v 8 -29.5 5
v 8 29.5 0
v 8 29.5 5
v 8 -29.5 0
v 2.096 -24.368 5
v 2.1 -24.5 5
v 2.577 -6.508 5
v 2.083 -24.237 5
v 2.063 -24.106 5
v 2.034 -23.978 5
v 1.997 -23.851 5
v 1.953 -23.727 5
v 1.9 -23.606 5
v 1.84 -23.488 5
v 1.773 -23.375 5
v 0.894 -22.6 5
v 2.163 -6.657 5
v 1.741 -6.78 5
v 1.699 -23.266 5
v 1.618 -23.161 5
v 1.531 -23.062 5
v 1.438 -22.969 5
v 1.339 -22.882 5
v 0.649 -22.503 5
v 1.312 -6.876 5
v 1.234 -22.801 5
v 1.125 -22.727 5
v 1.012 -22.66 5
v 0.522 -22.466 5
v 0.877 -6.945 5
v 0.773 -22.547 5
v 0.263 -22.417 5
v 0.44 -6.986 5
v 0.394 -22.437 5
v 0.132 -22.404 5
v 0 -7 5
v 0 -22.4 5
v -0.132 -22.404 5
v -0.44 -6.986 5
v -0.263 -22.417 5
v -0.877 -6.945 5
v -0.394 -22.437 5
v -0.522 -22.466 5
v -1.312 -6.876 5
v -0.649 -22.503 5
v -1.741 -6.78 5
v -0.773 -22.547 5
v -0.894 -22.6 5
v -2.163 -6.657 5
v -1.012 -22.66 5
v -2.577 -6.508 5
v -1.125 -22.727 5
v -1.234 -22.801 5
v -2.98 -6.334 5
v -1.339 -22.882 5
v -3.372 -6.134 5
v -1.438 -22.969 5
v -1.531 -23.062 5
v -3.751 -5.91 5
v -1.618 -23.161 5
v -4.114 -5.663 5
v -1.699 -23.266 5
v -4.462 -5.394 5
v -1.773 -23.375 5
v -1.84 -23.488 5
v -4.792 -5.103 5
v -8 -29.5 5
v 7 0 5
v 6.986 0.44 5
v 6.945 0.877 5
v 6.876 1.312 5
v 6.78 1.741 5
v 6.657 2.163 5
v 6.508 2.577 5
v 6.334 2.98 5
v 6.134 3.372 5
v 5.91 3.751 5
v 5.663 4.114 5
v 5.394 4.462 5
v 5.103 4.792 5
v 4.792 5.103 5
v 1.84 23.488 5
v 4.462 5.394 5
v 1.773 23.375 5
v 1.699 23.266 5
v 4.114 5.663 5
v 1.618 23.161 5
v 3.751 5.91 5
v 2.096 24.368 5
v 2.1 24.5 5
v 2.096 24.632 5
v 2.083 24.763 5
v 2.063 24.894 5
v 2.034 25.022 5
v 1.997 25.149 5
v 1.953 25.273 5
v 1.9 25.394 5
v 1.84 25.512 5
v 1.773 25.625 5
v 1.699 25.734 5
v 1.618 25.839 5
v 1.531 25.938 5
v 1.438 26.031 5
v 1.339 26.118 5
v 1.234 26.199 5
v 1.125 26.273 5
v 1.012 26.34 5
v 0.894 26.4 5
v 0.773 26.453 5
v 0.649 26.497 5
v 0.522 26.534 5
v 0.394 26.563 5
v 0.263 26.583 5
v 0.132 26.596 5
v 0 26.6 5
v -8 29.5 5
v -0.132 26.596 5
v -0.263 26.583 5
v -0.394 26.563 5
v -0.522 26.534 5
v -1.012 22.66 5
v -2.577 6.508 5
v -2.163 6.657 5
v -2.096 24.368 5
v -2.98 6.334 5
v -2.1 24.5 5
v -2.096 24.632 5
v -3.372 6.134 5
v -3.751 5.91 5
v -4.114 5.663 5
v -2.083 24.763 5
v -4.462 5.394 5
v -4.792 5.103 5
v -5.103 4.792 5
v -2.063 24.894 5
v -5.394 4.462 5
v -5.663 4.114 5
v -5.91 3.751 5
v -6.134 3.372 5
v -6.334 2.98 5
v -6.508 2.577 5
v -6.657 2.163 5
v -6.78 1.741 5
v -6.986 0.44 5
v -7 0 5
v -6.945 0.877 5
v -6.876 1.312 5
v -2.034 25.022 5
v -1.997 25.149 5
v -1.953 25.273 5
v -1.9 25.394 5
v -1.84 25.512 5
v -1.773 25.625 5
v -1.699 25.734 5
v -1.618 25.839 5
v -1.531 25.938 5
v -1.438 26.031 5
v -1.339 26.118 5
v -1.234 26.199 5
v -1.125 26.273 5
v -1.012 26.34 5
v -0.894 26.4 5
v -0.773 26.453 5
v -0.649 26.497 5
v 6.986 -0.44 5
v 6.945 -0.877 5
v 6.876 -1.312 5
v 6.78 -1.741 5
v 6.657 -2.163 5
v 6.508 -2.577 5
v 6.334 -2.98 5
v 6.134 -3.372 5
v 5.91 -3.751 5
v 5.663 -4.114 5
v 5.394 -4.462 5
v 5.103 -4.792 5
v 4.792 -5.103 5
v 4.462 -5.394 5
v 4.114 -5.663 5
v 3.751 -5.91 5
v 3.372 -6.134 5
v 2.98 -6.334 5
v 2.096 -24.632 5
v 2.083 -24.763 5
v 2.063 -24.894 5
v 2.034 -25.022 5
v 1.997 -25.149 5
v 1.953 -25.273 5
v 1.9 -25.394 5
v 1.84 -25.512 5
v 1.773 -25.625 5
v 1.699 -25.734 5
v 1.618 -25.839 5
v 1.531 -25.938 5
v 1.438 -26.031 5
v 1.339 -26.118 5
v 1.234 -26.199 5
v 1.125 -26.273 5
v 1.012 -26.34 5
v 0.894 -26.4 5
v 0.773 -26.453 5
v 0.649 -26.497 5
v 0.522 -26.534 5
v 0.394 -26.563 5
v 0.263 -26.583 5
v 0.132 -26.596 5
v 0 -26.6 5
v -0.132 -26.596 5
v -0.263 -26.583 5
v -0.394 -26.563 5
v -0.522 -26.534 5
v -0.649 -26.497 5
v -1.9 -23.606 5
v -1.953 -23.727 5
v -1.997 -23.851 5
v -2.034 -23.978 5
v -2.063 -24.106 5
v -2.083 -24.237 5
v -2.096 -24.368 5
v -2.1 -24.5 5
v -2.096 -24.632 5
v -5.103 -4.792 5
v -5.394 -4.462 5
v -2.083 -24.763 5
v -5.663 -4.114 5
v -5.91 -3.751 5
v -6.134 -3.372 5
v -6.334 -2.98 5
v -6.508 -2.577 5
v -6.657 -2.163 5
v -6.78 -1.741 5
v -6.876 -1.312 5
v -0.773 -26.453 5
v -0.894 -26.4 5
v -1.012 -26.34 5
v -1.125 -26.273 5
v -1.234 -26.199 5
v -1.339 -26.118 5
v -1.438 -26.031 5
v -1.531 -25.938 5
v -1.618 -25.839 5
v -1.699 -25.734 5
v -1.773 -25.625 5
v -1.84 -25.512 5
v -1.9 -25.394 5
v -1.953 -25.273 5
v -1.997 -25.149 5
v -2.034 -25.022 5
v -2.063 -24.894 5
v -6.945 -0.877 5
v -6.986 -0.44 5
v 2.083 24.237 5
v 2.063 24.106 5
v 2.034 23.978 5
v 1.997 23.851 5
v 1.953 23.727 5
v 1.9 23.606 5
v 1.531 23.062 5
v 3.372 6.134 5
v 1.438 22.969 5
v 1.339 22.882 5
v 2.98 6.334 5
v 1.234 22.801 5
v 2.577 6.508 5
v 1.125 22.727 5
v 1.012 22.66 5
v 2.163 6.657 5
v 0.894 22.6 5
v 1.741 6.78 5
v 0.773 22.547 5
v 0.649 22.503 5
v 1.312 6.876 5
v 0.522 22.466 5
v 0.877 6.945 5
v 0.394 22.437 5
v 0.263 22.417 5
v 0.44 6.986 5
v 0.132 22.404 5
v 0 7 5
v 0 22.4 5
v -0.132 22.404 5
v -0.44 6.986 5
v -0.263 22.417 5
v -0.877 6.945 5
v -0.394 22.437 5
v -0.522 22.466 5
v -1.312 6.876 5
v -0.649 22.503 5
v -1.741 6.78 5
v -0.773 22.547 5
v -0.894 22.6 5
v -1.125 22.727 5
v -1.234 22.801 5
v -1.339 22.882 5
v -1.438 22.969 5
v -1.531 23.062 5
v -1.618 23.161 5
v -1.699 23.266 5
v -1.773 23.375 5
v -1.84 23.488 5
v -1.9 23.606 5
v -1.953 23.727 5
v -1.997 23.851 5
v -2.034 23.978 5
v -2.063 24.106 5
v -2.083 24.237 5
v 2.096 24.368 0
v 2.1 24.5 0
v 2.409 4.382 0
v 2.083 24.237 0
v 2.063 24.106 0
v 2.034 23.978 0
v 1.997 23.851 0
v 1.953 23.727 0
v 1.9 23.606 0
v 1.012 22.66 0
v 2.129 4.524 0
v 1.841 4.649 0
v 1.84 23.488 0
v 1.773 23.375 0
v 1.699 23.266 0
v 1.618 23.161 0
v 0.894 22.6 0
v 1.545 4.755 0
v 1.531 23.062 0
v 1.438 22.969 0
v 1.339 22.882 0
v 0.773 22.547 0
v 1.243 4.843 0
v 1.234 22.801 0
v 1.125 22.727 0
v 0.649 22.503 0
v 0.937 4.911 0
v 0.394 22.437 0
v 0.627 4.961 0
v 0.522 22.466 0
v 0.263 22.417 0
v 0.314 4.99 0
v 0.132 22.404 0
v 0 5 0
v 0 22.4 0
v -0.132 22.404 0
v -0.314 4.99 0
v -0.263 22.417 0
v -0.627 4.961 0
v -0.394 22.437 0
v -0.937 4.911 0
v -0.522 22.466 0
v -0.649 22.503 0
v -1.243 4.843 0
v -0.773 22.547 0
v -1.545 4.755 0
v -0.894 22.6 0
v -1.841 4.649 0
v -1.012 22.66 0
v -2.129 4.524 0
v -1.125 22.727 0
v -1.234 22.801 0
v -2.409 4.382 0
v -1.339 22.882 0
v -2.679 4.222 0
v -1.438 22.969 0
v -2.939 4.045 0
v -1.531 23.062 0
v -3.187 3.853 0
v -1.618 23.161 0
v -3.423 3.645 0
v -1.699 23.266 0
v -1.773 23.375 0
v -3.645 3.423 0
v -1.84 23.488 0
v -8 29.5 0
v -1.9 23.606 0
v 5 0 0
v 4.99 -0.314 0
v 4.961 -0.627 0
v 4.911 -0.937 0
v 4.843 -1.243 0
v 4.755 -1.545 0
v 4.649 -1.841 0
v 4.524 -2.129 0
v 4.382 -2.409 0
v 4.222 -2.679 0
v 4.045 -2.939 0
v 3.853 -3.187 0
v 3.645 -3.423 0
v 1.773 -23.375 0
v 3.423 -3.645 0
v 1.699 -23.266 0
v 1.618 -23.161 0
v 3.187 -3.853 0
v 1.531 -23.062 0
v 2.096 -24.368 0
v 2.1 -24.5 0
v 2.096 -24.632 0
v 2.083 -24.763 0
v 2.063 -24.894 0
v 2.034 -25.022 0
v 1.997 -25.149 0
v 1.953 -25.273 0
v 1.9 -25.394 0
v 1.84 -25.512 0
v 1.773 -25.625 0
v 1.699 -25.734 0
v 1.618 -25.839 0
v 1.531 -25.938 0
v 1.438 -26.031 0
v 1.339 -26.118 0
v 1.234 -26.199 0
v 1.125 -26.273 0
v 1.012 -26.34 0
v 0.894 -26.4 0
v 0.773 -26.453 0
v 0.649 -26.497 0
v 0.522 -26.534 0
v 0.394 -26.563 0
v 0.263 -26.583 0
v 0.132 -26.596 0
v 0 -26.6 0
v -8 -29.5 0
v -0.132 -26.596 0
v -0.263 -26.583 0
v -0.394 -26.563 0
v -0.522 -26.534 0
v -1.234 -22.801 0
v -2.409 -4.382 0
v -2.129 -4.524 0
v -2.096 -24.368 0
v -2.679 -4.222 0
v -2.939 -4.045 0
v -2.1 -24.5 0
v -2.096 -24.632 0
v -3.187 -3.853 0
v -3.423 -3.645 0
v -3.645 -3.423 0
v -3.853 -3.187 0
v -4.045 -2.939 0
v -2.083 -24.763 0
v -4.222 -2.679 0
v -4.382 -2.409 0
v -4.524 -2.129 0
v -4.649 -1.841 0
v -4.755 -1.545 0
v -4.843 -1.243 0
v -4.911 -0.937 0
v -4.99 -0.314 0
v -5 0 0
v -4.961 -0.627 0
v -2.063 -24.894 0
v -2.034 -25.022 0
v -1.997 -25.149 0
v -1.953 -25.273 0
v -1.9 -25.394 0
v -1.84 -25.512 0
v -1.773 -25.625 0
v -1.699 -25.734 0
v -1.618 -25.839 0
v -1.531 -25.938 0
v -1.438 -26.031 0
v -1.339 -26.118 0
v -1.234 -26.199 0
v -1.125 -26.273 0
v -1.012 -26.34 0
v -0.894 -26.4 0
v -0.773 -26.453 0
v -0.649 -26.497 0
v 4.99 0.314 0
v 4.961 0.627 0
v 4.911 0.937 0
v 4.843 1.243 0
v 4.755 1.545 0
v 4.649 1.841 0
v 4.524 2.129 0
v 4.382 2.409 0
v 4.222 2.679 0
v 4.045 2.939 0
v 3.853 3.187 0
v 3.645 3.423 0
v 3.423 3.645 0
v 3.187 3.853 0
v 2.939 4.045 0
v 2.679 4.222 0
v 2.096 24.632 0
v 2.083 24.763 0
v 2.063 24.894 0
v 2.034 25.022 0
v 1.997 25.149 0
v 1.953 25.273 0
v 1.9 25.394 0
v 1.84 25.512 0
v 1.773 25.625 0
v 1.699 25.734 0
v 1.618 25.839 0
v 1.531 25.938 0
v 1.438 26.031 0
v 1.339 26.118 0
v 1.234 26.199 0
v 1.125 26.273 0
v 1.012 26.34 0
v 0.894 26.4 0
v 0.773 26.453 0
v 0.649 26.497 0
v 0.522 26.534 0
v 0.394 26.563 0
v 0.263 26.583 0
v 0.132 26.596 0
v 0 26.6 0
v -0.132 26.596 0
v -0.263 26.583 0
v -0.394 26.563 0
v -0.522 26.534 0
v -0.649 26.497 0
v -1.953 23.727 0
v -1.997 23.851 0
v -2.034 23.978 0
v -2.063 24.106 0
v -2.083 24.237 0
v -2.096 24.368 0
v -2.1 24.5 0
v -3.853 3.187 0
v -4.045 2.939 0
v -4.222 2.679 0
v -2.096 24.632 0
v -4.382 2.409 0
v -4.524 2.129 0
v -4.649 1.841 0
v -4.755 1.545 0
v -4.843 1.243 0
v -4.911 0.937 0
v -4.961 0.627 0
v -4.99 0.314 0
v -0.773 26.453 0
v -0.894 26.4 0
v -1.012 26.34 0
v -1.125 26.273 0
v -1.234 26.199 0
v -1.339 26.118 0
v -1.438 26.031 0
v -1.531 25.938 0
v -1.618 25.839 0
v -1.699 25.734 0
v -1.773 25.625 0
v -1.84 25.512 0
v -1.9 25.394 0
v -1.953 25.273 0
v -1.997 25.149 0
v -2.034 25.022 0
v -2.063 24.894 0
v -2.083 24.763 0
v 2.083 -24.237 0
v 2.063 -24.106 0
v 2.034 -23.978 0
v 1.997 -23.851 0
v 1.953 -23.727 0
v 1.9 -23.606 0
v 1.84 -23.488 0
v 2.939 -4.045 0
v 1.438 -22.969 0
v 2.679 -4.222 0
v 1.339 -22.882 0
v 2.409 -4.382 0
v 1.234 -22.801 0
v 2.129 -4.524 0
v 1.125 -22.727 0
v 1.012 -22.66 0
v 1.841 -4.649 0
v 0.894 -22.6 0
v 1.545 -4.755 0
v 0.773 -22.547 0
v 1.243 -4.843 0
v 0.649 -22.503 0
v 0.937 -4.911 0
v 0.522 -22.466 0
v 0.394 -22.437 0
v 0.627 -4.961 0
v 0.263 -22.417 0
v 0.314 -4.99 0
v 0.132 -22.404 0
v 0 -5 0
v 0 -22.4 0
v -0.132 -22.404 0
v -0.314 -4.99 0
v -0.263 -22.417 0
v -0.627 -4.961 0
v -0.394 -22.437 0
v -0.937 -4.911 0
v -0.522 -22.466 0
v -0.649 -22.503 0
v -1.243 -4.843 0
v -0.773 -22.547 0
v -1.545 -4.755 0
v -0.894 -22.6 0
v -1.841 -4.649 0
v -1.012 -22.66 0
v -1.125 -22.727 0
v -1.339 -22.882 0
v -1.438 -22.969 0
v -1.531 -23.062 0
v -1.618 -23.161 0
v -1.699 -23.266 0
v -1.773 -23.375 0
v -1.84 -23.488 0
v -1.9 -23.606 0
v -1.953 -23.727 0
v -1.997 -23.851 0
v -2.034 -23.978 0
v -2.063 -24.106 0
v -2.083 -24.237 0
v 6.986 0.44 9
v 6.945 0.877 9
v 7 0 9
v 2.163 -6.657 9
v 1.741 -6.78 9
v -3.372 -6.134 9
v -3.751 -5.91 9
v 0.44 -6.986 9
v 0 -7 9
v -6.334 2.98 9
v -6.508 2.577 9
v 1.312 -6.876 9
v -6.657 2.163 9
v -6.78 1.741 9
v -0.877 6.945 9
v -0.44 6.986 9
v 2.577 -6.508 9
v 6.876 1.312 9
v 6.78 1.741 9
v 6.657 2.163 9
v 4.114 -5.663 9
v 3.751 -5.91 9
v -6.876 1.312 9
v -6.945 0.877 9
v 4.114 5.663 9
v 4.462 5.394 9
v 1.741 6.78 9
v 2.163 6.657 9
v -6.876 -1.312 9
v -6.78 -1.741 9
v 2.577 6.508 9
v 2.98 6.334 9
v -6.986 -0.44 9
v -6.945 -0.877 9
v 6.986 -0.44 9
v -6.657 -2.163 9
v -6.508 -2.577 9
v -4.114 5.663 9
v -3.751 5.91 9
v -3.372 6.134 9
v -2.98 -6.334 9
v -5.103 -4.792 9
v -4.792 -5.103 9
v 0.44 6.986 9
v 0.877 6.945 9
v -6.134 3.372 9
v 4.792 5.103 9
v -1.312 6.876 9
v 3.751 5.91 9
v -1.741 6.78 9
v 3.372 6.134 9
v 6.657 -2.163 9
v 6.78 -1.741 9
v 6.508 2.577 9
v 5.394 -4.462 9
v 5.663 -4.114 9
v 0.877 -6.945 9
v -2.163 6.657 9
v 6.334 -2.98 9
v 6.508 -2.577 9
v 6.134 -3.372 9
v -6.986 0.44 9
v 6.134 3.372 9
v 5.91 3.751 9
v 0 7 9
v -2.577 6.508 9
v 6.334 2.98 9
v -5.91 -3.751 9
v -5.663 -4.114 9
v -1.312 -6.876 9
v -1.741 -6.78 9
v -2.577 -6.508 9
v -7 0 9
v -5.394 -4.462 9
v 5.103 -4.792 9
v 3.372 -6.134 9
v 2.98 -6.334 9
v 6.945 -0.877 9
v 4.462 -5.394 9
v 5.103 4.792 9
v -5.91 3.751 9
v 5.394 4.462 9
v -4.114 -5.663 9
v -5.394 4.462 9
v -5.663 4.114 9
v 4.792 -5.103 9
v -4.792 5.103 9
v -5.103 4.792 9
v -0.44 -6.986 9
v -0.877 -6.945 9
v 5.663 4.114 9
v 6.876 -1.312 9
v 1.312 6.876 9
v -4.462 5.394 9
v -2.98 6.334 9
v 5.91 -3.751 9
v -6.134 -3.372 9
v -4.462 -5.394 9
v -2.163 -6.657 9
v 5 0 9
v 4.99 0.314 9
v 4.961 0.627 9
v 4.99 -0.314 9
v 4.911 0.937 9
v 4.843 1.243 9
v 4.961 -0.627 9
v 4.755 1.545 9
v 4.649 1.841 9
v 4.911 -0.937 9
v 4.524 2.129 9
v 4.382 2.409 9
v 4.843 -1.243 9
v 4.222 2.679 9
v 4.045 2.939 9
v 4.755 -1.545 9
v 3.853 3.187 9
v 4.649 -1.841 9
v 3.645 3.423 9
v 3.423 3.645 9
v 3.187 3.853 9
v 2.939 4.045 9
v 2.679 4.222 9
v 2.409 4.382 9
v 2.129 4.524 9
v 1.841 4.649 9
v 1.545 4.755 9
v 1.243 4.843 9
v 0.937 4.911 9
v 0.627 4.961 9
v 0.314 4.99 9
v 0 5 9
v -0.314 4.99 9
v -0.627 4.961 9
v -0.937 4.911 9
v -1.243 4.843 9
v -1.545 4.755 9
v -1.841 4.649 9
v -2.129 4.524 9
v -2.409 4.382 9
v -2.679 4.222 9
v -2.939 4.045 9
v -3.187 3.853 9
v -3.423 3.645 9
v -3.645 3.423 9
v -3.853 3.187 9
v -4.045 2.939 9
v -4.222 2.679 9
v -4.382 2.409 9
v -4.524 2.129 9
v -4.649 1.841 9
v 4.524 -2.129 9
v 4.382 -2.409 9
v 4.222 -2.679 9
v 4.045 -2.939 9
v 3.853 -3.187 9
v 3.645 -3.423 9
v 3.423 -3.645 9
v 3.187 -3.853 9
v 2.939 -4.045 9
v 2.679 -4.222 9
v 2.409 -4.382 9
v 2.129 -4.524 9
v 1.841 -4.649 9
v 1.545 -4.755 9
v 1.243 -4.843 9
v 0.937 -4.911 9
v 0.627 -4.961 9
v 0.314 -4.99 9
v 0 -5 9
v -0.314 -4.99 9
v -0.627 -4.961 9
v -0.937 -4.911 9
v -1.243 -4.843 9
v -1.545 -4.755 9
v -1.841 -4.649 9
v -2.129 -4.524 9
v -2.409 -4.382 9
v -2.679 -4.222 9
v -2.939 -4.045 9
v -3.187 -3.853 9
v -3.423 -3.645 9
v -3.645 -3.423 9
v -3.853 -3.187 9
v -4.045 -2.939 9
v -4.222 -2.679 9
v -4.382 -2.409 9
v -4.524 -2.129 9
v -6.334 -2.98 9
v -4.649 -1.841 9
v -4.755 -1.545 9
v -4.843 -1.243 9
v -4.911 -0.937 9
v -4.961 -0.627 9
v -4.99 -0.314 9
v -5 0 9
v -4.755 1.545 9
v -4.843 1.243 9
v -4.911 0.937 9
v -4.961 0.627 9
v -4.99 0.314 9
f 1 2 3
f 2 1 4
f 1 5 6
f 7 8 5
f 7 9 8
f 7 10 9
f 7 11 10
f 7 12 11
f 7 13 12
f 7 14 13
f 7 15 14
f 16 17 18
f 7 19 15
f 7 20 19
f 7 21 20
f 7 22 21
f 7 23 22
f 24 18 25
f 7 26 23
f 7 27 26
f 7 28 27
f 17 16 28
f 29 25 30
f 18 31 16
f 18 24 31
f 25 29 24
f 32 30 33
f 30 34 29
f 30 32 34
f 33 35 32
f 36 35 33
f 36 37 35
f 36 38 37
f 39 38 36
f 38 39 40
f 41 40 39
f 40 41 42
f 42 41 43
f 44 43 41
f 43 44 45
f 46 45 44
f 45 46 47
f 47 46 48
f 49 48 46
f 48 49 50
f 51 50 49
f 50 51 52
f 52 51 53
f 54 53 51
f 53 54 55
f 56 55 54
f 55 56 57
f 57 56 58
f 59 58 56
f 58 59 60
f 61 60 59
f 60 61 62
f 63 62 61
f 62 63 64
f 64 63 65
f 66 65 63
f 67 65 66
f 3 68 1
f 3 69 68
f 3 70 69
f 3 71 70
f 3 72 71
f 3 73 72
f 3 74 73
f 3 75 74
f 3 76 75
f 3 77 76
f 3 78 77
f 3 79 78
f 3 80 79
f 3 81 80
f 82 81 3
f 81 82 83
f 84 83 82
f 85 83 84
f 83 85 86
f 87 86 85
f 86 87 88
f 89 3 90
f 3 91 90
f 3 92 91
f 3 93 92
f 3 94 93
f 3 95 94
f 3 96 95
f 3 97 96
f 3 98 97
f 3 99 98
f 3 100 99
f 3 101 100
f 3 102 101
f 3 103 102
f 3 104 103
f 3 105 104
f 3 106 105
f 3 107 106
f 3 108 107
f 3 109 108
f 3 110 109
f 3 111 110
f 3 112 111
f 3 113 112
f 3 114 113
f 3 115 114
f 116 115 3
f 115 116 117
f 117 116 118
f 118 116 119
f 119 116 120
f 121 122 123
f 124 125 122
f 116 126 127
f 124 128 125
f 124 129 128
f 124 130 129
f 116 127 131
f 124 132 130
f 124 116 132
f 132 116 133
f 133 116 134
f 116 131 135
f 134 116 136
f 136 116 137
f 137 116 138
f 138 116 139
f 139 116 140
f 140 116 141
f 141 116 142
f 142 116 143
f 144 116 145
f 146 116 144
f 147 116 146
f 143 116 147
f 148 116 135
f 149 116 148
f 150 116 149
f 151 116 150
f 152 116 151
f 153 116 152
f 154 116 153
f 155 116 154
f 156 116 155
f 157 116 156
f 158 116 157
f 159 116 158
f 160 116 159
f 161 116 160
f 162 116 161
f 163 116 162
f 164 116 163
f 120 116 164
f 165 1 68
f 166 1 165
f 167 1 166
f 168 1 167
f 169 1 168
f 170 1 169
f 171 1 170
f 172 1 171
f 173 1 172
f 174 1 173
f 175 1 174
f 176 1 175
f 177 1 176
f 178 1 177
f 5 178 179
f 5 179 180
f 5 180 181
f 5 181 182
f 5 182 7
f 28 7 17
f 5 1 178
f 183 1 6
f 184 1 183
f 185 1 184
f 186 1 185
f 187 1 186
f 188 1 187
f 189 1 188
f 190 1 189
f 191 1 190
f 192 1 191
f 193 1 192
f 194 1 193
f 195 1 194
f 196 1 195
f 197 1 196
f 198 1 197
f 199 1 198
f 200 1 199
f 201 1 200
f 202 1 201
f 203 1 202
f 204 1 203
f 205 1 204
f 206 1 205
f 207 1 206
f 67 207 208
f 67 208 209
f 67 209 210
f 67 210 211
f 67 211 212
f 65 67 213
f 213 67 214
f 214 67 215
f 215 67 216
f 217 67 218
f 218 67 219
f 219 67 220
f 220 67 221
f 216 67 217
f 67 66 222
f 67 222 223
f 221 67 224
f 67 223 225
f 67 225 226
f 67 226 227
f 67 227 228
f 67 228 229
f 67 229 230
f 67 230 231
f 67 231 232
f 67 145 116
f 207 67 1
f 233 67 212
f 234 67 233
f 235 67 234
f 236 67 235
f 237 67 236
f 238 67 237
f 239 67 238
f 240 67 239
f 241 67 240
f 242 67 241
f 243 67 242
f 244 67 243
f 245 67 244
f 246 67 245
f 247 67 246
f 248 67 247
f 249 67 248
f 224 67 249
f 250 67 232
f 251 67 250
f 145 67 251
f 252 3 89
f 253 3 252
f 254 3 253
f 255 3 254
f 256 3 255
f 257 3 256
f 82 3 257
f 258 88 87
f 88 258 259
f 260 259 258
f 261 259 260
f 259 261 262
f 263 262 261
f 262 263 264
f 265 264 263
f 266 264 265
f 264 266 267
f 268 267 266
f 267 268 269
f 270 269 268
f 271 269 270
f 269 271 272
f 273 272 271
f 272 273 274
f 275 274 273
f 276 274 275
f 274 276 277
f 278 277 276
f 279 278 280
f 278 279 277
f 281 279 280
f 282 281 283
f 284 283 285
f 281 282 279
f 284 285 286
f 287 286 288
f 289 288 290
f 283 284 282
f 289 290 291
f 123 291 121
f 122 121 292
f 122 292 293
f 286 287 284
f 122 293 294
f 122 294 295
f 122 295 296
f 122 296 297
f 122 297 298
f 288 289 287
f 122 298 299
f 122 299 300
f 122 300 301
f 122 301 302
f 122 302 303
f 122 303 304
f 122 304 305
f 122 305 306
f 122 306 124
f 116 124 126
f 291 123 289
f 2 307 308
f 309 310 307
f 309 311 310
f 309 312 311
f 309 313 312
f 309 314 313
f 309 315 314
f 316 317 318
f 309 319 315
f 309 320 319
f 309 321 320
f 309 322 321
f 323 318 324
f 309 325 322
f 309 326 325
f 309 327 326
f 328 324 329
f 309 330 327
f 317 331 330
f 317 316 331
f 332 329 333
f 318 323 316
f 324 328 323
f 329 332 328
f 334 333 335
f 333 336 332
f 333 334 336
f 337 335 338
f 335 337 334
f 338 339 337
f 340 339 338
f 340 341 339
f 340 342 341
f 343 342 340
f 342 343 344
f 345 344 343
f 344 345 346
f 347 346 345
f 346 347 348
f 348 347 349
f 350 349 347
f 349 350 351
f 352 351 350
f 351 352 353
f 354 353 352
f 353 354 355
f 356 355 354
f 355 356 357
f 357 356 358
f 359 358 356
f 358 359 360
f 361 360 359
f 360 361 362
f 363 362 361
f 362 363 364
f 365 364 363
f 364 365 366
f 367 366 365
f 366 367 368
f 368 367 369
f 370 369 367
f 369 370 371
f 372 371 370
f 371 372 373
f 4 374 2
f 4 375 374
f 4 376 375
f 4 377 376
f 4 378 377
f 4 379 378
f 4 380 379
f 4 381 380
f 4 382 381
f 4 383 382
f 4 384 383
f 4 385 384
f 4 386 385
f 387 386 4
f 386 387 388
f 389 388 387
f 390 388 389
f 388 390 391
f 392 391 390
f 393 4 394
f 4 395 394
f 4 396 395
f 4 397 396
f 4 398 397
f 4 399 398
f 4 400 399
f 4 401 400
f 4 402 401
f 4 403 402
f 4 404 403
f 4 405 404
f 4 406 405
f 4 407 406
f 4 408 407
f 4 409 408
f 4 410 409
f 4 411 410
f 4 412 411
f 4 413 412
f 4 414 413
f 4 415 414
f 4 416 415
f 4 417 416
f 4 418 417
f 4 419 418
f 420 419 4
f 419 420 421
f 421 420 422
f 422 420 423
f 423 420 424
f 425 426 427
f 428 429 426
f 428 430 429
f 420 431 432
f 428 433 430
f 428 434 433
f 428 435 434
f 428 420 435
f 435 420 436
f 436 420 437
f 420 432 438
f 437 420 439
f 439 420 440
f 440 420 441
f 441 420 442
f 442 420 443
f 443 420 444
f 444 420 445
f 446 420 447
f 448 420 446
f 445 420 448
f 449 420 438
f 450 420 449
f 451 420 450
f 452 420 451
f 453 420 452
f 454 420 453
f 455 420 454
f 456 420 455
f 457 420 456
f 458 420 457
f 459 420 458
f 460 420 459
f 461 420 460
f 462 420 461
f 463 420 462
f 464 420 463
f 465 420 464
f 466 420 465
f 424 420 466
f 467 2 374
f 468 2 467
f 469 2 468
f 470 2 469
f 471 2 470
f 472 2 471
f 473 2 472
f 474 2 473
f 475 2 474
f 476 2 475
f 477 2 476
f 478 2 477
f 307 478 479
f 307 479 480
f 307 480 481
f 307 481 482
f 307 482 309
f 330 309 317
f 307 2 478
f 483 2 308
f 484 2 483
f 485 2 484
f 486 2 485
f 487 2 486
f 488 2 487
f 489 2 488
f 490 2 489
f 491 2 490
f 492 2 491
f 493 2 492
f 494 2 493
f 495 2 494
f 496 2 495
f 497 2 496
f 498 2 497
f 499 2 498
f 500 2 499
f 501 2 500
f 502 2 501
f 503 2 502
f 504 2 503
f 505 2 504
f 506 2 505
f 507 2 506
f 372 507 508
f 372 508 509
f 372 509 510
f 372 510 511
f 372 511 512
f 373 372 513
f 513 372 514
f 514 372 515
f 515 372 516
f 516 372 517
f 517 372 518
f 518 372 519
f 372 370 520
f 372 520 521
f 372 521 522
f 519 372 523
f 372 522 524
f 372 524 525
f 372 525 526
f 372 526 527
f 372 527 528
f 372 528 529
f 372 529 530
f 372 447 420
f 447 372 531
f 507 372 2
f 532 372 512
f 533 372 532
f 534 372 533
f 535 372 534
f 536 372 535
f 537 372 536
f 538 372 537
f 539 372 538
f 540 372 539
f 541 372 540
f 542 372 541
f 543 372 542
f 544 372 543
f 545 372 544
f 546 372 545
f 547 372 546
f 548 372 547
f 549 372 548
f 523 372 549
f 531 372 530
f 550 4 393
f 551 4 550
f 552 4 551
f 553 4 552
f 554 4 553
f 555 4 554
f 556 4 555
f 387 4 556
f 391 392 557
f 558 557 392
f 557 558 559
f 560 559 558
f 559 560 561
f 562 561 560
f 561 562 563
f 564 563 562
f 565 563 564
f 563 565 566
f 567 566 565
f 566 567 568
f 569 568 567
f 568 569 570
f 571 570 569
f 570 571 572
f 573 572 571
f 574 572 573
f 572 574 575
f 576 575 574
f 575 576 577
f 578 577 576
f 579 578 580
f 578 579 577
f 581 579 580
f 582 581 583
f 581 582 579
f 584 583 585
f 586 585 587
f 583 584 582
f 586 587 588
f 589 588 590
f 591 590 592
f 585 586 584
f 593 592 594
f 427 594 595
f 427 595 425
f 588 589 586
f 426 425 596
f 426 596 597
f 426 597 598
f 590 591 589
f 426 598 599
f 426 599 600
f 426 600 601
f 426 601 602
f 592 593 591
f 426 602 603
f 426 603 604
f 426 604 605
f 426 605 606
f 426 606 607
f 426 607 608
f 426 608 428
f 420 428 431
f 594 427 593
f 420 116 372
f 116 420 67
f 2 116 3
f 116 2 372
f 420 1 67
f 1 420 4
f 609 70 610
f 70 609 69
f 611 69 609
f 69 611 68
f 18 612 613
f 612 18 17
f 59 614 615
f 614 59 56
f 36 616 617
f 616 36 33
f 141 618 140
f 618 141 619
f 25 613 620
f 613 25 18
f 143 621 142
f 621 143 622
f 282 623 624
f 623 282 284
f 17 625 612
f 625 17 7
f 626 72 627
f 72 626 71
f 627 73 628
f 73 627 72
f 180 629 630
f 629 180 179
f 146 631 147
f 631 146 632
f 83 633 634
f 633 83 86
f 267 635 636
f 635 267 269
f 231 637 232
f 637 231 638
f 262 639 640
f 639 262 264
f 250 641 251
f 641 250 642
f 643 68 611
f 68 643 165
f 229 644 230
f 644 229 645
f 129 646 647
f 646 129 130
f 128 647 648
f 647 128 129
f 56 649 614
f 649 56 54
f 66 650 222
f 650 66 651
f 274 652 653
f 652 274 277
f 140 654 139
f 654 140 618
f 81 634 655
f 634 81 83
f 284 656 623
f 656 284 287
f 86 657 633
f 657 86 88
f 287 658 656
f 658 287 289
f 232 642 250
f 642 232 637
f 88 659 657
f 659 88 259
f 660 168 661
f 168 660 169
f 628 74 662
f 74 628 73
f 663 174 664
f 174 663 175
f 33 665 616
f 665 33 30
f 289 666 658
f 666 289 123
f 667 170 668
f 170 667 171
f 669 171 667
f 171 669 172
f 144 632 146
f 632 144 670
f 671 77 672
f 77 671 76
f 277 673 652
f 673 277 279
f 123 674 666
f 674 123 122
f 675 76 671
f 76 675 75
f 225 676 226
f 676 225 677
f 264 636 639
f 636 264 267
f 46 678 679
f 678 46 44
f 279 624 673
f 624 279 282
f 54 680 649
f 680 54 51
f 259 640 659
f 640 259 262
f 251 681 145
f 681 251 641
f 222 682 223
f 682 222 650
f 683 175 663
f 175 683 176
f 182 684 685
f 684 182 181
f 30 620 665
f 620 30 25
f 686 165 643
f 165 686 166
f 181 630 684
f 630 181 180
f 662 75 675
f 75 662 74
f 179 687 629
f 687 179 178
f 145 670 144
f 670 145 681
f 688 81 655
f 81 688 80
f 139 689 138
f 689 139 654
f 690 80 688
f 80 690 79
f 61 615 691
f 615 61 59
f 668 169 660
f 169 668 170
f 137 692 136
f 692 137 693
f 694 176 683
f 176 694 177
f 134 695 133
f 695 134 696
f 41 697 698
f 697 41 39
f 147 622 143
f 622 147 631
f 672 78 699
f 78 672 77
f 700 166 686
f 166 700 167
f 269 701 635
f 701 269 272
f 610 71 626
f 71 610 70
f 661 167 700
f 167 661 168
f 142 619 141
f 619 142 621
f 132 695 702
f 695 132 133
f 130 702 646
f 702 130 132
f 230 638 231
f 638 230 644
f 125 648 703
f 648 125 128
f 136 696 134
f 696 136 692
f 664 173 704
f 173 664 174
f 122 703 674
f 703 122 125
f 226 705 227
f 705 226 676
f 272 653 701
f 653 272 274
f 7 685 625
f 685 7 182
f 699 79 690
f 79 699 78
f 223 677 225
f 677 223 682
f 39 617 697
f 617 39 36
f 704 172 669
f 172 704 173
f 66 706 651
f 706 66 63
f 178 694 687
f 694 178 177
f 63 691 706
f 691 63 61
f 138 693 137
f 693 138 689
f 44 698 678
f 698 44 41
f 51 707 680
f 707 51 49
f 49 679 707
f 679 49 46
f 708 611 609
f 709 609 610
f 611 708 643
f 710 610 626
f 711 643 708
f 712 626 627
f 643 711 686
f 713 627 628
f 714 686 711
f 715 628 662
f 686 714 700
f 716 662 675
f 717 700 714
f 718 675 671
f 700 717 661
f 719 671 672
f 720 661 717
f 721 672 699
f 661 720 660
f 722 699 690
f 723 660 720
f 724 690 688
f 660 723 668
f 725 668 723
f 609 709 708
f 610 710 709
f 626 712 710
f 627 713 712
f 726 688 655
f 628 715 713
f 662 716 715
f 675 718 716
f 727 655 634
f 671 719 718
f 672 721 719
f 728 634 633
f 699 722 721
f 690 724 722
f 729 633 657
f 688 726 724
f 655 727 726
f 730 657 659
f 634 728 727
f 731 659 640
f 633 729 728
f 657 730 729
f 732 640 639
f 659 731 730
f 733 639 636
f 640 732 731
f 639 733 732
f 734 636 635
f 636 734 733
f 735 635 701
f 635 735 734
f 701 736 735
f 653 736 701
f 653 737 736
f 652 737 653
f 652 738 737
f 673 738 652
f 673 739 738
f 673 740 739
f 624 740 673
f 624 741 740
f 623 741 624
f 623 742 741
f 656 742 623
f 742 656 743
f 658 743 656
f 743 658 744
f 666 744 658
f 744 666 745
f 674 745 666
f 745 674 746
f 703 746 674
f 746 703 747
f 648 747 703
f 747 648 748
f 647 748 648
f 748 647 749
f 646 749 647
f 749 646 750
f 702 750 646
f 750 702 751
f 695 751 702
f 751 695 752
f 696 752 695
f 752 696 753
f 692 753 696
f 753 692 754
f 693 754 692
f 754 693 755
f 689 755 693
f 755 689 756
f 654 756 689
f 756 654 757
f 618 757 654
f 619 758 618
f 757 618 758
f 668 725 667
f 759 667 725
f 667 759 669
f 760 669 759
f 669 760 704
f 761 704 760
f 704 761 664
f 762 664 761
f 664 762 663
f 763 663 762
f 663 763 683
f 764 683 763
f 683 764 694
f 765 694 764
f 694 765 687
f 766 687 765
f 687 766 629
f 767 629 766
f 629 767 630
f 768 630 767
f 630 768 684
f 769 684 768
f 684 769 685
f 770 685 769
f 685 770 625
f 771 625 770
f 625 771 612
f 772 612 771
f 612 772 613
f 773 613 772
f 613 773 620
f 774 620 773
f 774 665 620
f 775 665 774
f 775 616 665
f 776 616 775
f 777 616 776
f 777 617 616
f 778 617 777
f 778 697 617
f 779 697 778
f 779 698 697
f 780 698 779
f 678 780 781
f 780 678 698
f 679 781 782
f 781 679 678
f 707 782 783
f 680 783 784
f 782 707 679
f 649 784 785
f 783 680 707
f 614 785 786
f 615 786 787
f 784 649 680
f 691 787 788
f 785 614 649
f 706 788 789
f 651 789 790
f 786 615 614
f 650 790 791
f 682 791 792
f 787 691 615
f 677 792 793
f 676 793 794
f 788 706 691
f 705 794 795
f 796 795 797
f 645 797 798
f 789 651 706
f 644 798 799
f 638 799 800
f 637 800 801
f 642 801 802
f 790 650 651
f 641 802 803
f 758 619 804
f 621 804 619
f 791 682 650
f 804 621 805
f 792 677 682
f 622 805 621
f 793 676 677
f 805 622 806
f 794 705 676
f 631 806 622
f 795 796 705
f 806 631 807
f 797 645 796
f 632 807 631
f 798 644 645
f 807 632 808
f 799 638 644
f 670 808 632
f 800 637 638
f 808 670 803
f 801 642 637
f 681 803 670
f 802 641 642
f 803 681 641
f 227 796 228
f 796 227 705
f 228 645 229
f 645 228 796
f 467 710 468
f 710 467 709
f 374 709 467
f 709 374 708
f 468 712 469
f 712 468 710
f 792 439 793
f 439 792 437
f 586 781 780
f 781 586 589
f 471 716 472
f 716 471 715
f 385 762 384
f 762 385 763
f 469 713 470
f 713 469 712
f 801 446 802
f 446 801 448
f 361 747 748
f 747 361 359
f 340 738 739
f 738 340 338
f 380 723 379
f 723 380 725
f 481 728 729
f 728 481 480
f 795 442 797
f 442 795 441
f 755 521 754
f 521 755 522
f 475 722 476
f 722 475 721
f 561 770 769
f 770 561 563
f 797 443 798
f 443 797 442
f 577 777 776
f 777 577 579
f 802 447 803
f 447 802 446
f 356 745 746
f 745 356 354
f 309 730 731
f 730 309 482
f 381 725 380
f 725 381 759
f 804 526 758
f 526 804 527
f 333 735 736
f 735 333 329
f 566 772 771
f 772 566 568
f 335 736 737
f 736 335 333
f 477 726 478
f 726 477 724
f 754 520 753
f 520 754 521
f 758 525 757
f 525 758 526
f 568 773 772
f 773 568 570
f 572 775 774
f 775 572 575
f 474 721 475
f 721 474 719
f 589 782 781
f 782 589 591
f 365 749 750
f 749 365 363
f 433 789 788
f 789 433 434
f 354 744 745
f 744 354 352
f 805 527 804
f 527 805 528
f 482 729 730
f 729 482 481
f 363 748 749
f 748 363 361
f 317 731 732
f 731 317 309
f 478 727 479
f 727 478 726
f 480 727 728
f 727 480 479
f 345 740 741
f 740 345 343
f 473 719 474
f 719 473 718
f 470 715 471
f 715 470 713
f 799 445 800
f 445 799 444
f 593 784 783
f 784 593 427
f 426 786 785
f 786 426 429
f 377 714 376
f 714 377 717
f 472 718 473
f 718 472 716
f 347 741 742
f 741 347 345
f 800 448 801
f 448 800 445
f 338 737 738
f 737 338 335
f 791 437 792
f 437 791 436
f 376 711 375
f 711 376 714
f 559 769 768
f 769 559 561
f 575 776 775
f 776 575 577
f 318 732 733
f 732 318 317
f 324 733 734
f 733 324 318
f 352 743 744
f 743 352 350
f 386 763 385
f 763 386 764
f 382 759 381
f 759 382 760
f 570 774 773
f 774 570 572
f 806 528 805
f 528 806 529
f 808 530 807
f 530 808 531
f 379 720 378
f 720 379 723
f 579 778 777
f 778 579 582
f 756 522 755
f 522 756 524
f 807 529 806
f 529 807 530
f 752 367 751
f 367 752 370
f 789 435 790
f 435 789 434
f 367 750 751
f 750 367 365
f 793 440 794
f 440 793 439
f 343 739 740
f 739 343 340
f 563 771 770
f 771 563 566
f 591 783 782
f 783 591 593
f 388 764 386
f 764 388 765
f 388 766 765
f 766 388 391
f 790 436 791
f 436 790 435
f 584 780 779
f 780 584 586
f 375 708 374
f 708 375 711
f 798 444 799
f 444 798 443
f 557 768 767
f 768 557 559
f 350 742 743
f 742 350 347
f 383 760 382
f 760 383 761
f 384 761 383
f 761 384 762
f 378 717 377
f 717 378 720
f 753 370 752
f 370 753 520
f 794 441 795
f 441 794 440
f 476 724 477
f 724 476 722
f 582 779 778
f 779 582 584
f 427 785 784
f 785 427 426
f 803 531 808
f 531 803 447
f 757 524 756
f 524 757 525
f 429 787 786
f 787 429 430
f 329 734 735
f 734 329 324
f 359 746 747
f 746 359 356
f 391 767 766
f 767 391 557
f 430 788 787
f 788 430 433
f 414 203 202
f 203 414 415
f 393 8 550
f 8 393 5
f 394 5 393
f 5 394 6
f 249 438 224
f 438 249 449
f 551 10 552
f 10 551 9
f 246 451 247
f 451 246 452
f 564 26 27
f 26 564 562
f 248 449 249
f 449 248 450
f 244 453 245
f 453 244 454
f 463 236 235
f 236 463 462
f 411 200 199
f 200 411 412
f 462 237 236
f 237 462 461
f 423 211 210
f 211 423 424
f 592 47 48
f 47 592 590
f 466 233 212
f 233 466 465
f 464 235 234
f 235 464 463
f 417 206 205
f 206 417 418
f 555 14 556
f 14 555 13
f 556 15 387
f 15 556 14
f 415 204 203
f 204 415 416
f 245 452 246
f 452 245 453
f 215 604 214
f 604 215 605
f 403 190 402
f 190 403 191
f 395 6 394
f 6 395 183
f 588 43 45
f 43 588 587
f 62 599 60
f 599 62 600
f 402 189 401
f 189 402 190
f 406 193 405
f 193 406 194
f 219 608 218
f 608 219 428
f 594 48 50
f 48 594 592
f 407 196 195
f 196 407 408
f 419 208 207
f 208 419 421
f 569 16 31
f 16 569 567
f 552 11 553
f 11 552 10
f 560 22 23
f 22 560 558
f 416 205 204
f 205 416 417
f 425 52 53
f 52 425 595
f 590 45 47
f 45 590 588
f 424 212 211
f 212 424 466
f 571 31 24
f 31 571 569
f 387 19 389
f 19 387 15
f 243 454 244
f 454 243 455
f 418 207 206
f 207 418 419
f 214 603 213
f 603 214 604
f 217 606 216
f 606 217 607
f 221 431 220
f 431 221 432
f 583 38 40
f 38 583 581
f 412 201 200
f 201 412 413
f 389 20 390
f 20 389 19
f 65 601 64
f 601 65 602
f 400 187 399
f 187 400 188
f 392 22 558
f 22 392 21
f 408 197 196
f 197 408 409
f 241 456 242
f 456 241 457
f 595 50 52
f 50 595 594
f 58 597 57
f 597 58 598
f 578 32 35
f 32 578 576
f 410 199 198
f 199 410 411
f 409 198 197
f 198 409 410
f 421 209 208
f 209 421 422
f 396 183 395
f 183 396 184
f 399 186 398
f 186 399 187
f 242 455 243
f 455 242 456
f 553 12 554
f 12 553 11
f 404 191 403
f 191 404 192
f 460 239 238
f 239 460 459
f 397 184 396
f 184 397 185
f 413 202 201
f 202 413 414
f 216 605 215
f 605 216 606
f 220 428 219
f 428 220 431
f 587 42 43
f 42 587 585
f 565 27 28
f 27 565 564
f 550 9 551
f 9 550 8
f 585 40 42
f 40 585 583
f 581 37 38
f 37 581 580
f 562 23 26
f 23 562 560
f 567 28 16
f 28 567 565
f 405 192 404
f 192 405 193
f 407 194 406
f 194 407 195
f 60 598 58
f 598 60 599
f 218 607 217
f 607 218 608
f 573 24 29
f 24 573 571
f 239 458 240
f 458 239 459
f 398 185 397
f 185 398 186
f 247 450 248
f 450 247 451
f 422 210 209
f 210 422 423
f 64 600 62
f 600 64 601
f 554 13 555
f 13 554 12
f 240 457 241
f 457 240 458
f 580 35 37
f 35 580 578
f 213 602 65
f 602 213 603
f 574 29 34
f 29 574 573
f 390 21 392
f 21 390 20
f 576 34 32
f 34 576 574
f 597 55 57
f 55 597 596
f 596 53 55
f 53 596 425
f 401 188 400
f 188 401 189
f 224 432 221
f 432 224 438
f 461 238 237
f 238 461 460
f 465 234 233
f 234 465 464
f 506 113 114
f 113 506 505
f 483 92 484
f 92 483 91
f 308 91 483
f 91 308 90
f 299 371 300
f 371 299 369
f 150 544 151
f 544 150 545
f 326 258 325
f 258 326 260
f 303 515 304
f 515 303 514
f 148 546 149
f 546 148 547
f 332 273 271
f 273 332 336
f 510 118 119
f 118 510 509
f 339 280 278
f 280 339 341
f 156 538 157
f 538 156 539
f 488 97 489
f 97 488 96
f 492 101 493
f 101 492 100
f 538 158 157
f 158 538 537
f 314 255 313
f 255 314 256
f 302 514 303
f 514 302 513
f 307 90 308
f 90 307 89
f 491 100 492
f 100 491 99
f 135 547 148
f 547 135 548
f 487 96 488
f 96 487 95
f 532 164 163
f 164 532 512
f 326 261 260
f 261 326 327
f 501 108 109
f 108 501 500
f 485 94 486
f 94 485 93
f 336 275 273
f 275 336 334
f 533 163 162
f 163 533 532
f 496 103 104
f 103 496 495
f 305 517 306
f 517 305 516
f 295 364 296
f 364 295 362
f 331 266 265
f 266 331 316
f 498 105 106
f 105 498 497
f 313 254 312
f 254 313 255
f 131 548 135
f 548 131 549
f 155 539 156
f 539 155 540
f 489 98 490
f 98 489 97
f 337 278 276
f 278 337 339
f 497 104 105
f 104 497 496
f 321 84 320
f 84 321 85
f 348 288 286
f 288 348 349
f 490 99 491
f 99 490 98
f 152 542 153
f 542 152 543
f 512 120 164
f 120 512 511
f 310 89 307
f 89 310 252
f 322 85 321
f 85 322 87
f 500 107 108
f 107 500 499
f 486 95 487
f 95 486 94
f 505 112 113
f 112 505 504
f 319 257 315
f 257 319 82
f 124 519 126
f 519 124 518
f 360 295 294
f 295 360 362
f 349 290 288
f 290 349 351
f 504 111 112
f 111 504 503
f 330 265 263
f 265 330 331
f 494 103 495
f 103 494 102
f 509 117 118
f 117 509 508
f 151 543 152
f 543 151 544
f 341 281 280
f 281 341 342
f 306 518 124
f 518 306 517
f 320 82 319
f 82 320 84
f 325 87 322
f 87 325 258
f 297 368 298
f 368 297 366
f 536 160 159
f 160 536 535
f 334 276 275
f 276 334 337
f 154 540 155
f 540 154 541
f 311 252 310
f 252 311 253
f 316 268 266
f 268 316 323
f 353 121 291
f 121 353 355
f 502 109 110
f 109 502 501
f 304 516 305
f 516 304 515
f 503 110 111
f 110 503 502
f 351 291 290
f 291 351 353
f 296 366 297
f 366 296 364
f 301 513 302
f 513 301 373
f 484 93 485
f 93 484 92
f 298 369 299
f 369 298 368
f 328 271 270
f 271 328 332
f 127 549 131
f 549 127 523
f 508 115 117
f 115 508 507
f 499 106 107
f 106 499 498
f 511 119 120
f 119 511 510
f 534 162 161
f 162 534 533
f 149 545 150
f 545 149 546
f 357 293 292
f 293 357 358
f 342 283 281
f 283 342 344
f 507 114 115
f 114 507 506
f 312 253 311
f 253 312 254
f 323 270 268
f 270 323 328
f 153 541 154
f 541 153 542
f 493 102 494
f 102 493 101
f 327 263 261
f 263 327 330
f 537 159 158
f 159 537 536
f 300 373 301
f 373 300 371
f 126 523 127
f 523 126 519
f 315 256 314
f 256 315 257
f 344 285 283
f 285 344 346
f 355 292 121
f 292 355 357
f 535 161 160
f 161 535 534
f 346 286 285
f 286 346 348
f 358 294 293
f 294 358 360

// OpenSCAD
module gregs_to_bowden(){

dia = 49;
extrawidth = 5;

height = 5;
extraheight = 9-height;
width = 16;
m8hole = 10;
m4hole = 4.2;
$fn=100;
	difference(){
		union(){
			translate([-width/2,-dia/2-extrawidth,0]) cube([width,dia+extrawidth*2,height]);
			#cylinder(height+extraheight,m8hole/2+2,m8hole/2+2);		
		}
		#cylinder(20,m8hole/2,m8hole/2);
		translate([0,-dia/2,0]) #cylinder(height+1,m4hole/2,m4hole/2);
		translate([0,dia/2,0]) #cylinder(height+1,m4hole/2,m4hole/2);

	}

}

gregs_to_bowden();
